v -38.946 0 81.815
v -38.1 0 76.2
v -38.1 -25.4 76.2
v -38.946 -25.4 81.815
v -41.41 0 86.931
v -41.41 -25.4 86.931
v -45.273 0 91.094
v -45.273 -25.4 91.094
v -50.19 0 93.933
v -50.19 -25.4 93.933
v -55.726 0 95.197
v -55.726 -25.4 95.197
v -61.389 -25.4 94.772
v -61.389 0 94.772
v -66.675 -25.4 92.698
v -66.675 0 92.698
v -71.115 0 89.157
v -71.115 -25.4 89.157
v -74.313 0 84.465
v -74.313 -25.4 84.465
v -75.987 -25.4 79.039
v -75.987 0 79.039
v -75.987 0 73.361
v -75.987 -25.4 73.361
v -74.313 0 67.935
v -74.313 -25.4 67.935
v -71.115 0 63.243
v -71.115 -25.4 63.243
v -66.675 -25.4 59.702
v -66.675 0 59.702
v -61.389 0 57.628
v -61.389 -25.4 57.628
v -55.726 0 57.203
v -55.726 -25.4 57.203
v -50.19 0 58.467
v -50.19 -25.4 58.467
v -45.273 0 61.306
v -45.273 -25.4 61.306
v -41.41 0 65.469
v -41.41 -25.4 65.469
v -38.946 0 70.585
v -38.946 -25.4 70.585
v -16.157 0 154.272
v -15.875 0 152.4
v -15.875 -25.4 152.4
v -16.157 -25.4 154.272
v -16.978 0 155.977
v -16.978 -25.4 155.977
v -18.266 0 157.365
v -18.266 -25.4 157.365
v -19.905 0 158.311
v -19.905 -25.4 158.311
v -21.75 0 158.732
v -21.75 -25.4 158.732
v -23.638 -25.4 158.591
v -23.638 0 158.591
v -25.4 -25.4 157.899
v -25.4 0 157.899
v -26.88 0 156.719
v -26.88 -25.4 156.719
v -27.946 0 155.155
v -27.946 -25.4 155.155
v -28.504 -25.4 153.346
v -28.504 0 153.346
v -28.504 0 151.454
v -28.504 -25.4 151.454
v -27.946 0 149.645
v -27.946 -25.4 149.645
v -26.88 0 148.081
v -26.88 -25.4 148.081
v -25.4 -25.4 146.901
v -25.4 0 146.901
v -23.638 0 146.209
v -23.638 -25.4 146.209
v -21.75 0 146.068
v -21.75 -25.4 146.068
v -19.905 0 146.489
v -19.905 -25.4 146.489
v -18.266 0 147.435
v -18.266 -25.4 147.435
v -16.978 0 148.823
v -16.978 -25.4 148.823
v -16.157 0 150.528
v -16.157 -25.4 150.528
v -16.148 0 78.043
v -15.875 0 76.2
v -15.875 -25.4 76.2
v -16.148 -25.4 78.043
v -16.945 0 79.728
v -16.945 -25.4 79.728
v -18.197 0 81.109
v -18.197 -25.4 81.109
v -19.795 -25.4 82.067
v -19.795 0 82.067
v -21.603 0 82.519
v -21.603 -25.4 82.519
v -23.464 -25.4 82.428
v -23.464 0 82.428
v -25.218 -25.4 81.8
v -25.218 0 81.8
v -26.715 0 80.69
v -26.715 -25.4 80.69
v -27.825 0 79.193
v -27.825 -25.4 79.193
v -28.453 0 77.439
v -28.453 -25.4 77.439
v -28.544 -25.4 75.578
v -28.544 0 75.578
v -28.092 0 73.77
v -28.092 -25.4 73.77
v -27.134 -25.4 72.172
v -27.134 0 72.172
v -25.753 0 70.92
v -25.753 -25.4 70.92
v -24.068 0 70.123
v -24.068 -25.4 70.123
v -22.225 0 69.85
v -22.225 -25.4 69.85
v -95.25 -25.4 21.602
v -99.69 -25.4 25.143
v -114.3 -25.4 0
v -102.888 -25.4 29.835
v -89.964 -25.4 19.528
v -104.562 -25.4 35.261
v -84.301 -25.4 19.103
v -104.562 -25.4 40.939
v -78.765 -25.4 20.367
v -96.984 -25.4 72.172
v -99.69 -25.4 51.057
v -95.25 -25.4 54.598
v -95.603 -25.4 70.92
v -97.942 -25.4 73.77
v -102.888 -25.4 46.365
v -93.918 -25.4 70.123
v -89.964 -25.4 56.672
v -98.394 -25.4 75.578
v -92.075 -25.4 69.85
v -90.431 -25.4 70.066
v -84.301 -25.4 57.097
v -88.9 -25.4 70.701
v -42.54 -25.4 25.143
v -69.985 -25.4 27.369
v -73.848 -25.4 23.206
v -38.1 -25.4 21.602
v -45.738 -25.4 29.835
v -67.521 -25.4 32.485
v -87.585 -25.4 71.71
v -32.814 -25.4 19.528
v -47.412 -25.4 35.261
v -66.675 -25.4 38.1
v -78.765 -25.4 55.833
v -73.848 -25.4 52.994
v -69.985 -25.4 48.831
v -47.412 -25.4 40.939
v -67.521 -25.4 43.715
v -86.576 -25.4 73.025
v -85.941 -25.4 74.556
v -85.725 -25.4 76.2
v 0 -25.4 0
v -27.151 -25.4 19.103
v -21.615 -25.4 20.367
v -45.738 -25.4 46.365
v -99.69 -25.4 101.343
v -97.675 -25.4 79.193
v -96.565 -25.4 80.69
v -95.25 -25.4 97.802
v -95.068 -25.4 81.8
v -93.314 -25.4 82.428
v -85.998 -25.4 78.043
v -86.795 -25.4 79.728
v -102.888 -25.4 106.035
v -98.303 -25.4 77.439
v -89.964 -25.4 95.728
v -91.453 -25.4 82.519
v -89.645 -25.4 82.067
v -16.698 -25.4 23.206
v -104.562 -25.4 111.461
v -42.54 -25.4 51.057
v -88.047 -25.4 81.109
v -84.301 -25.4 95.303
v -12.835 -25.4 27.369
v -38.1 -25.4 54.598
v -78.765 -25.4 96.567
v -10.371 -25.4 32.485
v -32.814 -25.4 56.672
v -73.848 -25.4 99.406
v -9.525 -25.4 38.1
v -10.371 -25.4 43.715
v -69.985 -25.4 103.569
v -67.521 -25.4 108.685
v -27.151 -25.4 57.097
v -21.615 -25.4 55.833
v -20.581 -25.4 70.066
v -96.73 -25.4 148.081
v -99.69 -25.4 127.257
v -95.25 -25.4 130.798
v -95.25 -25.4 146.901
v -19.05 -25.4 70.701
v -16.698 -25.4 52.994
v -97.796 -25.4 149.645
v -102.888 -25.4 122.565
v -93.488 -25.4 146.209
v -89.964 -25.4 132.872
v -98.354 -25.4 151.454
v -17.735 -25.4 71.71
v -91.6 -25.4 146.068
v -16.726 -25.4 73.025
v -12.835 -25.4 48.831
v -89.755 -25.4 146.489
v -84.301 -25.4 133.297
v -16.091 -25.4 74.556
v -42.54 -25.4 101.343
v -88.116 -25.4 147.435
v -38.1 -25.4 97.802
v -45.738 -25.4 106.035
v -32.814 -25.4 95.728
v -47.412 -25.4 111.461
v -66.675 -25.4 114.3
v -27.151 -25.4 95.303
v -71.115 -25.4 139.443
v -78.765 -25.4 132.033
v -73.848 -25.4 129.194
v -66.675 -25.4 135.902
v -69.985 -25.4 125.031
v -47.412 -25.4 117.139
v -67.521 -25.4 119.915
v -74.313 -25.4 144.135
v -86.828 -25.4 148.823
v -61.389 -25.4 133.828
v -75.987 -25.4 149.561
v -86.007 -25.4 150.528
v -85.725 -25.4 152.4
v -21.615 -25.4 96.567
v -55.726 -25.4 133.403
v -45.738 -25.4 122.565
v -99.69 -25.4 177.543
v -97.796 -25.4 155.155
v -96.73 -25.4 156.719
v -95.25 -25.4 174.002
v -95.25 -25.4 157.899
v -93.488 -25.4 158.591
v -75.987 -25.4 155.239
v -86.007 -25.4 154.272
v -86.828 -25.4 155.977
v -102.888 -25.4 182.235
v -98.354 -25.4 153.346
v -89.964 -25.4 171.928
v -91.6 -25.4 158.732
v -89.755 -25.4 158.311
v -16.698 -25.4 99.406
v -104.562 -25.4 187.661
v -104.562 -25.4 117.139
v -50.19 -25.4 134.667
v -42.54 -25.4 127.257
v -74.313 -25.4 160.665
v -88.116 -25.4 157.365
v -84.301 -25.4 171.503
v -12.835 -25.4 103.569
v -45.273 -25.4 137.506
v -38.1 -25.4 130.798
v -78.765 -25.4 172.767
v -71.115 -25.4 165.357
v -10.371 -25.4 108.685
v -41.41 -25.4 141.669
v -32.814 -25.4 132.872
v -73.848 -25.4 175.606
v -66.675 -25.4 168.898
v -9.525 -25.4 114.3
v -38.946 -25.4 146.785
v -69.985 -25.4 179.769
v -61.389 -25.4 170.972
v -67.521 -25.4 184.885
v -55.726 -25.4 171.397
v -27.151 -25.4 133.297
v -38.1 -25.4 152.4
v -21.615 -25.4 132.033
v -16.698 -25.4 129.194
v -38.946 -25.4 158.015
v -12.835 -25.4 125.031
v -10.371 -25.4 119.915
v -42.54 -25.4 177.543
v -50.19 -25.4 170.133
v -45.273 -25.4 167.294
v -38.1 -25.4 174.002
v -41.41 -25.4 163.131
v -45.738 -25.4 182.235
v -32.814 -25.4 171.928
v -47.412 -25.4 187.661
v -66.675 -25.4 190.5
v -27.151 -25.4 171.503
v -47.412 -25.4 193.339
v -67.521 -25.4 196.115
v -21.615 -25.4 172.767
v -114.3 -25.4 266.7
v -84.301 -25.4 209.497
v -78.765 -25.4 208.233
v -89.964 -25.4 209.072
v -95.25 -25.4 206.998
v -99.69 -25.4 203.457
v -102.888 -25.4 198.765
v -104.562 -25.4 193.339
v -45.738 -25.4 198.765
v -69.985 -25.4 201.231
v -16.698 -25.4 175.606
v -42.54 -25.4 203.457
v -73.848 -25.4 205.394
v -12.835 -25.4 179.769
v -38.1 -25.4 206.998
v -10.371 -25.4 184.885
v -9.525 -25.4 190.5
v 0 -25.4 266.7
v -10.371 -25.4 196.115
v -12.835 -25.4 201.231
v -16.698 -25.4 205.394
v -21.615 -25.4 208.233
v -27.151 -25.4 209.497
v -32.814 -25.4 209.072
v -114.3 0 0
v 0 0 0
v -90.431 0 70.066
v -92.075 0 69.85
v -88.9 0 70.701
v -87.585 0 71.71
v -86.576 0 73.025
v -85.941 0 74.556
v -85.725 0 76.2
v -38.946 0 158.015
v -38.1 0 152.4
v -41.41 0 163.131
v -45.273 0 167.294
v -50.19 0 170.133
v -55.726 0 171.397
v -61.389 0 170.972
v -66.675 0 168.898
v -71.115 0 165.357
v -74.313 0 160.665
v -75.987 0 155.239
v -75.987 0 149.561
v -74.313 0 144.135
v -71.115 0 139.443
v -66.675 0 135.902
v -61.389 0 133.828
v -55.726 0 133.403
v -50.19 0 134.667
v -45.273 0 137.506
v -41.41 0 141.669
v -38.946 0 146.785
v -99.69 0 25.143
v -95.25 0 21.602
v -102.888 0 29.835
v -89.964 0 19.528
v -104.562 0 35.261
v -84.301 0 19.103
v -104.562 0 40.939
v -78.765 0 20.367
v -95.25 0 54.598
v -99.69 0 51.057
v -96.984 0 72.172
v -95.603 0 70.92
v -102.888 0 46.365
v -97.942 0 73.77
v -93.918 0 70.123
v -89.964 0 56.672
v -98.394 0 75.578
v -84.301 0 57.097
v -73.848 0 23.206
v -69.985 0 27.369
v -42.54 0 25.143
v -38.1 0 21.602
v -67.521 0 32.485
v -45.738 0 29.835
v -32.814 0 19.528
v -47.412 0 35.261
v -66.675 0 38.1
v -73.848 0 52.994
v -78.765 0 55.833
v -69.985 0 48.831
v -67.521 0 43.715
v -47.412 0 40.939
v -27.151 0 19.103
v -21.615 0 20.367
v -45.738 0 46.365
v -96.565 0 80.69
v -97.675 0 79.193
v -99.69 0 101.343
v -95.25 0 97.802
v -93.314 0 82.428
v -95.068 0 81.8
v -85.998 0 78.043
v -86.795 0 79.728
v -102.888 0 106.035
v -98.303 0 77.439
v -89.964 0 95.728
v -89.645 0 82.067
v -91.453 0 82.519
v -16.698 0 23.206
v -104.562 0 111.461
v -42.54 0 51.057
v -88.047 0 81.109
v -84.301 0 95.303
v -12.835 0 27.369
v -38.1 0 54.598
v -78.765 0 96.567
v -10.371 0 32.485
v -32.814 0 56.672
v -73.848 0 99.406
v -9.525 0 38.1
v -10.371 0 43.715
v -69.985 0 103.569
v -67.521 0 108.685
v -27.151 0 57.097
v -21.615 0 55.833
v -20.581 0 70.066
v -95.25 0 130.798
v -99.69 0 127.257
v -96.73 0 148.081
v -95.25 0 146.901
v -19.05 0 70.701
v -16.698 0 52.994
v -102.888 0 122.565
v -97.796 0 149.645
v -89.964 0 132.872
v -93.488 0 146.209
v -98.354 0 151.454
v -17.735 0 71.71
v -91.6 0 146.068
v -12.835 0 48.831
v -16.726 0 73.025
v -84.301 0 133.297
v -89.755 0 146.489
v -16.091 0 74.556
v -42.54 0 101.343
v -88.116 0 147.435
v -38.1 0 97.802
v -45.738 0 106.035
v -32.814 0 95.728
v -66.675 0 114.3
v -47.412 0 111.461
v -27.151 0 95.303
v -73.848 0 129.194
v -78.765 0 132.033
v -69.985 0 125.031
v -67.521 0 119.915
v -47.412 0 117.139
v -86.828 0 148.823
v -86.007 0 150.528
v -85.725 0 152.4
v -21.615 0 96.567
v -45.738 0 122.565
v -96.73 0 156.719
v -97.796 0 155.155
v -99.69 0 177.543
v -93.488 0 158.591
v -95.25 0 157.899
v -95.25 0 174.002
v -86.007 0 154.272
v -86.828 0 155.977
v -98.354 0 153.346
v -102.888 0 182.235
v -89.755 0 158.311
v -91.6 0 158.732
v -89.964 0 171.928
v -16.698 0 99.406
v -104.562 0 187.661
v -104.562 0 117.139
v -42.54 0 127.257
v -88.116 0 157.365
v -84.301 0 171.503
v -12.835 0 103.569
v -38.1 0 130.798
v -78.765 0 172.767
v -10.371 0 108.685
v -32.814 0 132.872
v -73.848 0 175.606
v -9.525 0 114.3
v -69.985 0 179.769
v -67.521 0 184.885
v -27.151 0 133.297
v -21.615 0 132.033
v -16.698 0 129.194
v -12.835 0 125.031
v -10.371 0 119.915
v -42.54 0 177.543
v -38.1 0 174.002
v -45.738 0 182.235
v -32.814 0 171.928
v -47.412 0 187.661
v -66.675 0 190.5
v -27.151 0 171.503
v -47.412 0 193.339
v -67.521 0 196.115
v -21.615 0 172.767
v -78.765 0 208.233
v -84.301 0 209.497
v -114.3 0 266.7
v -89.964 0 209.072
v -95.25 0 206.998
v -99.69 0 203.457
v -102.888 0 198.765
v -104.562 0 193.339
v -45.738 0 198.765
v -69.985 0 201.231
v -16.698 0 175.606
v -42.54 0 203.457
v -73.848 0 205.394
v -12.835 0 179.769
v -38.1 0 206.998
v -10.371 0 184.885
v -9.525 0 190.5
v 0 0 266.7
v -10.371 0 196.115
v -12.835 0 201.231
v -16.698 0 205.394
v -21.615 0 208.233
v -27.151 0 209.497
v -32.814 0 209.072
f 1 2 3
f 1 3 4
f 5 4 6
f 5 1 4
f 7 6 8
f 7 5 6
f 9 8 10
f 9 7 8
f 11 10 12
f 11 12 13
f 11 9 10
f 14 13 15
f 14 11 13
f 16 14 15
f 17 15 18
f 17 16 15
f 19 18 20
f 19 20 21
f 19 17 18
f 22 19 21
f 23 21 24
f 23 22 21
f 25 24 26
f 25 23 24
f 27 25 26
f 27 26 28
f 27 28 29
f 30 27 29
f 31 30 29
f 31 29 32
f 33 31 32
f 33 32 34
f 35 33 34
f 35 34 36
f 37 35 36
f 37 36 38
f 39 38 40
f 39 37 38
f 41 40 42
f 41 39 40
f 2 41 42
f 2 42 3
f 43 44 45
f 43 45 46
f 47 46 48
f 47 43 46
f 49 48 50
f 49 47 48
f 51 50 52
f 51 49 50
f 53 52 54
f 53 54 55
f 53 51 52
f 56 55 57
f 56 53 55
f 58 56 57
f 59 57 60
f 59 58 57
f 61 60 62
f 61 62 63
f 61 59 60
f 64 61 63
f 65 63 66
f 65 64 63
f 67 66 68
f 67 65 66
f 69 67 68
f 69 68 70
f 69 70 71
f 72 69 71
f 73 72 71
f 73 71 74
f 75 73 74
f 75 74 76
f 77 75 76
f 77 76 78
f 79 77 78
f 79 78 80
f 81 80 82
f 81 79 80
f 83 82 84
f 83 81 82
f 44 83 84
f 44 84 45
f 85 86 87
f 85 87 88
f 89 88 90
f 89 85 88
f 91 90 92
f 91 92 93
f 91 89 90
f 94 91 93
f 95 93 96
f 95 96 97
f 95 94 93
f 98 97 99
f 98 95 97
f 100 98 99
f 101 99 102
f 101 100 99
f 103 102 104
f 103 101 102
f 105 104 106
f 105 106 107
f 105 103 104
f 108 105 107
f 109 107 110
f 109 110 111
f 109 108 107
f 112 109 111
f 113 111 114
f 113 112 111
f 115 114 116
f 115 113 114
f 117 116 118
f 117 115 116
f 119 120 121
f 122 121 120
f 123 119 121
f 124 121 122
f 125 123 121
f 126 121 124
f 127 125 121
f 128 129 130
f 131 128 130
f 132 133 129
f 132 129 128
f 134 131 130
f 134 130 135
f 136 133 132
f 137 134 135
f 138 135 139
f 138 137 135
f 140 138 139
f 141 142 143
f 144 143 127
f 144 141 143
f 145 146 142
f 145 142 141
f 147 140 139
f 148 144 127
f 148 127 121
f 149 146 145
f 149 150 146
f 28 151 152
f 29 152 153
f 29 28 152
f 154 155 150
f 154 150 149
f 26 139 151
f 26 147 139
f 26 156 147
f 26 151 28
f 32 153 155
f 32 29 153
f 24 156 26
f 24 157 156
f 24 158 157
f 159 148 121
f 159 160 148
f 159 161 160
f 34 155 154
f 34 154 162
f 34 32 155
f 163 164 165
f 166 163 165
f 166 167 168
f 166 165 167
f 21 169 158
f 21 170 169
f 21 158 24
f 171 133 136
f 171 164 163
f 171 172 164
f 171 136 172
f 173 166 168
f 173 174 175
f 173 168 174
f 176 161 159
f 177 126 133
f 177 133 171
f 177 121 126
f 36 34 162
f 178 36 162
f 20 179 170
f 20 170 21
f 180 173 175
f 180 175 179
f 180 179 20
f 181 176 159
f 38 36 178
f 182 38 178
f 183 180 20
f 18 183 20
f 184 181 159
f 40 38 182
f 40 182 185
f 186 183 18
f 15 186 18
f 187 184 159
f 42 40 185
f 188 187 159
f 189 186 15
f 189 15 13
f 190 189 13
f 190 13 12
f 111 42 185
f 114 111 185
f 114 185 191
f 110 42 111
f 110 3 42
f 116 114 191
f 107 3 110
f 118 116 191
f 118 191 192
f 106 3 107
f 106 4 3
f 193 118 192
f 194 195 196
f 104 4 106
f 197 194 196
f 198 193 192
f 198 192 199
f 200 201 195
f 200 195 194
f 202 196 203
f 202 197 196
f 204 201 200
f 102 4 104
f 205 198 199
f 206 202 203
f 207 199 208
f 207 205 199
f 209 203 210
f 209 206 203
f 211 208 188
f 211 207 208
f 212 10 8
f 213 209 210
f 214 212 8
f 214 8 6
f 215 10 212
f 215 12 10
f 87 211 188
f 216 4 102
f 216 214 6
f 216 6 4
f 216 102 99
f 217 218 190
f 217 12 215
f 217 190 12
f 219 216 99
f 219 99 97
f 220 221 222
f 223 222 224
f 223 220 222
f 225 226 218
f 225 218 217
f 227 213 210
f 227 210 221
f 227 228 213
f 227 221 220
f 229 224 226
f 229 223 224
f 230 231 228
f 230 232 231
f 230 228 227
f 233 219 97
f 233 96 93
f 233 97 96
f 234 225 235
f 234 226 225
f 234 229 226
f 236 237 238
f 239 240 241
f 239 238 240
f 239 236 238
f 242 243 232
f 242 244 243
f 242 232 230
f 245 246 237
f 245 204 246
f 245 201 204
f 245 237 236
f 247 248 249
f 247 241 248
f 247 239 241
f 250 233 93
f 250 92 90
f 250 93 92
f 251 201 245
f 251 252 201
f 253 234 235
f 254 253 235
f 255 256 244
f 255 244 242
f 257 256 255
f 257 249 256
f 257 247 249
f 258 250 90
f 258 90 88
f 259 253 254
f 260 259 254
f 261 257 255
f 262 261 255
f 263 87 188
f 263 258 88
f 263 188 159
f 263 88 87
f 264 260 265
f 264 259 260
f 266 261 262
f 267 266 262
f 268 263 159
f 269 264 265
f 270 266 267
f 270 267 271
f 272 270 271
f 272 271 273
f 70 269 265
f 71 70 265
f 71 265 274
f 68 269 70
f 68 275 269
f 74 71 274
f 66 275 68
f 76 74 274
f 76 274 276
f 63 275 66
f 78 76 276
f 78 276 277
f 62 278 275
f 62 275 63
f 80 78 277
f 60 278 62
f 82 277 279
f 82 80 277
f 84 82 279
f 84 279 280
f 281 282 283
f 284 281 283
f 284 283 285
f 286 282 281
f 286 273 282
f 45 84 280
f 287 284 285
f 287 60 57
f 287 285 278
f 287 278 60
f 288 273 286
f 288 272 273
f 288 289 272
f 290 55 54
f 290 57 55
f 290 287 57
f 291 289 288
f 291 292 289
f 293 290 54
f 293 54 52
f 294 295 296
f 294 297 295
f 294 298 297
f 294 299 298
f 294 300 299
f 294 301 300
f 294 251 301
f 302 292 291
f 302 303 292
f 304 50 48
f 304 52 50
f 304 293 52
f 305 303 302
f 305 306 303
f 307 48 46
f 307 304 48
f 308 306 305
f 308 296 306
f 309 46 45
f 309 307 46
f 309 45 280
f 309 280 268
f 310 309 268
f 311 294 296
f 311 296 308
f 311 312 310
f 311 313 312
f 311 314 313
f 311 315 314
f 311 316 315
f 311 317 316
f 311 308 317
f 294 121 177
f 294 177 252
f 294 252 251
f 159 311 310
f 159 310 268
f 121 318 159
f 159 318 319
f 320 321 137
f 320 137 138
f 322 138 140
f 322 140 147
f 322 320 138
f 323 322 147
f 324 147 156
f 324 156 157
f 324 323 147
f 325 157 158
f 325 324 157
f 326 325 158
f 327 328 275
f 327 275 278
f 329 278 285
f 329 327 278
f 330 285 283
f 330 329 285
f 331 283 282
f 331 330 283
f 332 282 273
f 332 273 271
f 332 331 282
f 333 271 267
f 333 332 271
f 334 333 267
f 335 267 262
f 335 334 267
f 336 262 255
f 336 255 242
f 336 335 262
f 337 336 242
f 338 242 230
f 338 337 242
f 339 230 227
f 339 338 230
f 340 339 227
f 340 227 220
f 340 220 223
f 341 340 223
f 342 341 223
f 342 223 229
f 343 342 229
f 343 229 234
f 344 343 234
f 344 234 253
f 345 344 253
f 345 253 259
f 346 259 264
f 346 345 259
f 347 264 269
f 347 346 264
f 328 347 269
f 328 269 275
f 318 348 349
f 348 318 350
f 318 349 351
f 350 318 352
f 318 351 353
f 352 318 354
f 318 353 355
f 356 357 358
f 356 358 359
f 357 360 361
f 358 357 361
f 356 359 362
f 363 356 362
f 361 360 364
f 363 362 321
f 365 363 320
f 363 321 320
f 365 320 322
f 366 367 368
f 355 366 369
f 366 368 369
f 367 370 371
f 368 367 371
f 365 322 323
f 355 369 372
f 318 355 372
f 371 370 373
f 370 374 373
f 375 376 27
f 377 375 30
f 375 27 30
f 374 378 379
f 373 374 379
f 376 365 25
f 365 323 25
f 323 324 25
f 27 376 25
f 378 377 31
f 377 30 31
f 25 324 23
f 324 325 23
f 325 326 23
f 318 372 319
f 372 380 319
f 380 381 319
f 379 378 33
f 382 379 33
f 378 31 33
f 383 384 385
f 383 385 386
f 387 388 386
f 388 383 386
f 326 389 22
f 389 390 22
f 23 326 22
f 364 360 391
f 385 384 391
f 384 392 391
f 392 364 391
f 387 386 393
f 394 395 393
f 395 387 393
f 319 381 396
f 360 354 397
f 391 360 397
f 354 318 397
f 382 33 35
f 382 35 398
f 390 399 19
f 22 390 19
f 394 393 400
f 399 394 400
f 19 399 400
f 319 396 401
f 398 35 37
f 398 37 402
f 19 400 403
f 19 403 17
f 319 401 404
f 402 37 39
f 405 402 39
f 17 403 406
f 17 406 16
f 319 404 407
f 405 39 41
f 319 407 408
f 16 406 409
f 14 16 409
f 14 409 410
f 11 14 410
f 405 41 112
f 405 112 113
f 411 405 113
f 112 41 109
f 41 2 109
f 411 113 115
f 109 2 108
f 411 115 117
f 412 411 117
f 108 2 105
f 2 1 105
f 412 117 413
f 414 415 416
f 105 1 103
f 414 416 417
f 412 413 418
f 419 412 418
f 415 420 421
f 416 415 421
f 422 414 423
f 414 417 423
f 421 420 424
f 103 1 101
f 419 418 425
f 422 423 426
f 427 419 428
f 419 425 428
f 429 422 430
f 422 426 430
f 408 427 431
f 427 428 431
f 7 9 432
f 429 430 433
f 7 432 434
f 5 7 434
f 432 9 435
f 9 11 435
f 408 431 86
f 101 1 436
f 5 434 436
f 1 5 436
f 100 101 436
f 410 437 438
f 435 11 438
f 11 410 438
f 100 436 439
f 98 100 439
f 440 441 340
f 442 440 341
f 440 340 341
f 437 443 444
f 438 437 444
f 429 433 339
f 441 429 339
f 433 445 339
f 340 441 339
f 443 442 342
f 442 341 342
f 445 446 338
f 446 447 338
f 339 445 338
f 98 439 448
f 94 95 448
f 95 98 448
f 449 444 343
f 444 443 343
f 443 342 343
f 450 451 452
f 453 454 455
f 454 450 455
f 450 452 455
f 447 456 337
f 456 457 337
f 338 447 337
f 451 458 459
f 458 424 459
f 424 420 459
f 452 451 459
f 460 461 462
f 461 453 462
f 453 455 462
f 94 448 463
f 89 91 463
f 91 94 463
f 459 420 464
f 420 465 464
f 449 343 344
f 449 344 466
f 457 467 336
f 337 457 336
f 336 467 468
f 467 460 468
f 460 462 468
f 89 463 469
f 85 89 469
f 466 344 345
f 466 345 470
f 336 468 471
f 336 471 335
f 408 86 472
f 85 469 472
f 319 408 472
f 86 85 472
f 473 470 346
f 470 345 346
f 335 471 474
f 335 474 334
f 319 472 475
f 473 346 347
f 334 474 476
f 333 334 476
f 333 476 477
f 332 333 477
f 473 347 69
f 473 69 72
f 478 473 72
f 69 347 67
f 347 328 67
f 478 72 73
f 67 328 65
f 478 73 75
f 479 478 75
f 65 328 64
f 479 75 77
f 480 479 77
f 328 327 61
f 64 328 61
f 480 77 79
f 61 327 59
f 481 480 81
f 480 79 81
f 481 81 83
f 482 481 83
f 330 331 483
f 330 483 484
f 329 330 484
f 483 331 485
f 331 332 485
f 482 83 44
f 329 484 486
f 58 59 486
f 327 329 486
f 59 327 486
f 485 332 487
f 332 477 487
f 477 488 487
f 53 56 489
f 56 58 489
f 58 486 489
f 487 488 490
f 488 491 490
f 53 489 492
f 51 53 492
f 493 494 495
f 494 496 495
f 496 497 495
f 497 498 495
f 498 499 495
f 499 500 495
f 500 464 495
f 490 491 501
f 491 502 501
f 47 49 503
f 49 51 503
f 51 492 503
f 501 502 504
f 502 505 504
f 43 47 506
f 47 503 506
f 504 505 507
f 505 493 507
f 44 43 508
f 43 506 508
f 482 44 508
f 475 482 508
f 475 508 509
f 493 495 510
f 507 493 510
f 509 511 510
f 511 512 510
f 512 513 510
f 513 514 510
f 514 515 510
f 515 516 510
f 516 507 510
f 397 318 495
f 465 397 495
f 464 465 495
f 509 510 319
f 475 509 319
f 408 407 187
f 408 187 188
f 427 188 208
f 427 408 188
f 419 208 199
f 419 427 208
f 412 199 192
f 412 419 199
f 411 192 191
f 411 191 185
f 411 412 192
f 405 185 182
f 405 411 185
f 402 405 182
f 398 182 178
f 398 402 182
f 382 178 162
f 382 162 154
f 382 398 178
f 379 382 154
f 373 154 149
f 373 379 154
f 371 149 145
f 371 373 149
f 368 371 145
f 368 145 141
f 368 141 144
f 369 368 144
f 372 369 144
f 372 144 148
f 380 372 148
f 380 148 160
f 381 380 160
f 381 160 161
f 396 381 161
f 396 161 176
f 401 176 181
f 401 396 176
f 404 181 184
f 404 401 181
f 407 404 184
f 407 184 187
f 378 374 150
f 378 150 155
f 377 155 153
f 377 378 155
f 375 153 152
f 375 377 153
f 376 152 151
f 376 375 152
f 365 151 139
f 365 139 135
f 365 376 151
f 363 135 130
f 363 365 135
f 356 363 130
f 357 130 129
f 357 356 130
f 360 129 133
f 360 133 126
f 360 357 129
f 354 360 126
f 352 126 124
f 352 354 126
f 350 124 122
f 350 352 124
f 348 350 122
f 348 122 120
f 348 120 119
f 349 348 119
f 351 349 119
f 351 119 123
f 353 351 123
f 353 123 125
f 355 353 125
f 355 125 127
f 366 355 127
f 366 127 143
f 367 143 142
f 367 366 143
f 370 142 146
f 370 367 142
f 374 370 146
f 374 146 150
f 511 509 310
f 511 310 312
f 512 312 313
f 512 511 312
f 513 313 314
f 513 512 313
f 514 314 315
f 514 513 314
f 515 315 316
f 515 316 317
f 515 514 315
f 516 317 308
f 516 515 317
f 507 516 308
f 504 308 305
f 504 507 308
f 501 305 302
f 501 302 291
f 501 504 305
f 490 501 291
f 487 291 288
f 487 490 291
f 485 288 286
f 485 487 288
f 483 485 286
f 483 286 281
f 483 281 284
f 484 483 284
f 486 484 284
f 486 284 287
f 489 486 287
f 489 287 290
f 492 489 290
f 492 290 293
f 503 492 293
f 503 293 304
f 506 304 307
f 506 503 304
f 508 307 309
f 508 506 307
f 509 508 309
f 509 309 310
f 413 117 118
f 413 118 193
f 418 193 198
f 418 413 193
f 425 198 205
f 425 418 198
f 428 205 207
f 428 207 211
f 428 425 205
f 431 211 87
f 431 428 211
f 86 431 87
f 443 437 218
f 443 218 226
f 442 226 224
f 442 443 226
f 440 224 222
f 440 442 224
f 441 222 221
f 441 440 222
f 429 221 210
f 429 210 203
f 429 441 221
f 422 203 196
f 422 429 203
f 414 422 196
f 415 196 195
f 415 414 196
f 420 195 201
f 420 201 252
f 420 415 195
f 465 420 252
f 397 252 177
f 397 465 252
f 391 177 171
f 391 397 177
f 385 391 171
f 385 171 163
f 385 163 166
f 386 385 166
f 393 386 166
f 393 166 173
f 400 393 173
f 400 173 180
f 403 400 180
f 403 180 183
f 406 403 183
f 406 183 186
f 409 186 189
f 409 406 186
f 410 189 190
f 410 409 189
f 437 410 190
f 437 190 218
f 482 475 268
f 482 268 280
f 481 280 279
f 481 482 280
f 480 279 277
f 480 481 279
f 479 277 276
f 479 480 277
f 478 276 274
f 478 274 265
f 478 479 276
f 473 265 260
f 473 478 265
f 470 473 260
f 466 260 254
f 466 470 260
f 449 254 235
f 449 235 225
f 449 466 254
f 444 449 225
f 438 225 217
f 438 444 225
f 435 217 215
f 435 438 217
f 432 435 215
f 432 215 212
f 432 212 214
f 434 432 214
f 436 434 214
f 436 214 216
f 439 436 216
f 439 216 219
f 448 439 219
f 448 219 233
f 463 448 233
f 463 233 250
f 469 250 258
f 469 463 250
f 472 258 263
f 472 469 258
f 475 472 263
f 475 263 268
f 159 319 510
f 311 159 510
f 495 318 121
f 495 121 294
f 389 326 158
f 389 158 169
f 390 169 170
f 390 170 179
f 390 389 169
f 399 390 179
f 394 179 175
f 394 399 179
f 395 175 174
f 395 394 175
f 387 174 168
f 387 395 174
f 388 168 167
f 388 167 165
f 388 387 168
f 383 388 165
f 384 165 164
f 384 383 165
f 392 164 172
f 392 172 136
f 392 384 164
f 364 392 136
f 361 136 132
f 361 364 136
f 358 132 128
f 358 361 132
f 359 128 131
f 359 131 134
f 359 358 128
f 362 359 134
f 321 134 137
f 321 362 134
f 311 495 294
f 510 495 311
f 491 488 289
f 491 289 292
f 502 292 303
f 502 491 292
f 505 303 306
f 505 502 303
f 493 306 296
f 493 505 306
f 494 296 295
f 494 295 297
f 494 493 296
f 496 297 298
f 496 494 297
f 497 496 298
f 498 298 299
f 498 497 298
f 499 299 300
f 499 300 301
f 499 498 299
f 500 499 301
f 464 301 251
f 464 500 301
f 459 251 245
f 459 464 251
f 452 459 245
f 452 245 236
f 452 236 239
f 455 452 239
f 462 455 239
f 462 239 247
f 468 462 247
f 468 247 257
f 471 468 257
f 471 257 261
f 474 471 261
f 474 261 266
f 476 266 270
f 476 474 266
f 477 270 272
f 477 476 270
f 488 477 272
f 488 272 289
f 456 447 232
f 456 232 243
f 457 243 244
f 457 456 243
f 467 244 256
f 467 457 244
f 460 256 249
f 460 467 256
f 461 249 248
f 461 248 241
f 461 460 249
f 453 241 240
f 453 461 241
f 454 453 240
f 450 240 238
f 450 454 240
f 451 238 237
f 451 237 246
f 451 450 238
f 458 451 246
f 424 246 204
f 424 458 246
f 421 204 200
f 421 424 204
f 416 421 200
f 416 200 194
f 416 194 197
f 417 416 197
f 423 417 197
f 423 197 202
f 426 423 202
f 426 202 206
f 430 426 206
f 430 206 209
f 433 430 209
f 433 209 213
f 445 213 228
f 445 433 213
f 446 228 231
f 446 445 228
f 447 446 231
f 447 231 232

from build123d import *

# Parameters (mm, degrees)
F0_W     = 114.3
F0_H     = 266.7
F3_DEPTH = 25.4
F1_R     = 19.05
F4_DEPTH = 25.4
F2_R     = 6.35
F5_DEPTH = 25.4


with BuildPart() as f3:
    # F0 (on Front) → F3 (new body)
    with BuildSketch(Plane.XZ):
        with Locations((-57.15, 133.35)):
            Rectangle(F0_W, F0_H)
    extrude(amount=F3_DEPTH)

    # F1 (on face) → F4 (cut)
    with BuildSketch(Plane.XZ):
        with Locations((-85.725, 38.1)):
            Circle(F1_R)
        with Locations((-28.575, 38.1)):
            Circle(F1_R)
        with Locations((-57.15, 76.2)):
            Circle(F1_R)
        with Locations((-57.15, 152.4)):
            Circle(F1_R)
        with Locations((-28.575, 114.3)):
            Circle(F1_R)
        with Locations((-85.725, 114.3)):
            Circle(F1_R)
        with Locations((-28.575, 190.5)):
            Circle(F1_R)
        with Locations((-85.725, 190.5)):
            Circle(F1_R)
    extrude(amount=F4_DEPTH, mode=Mode.SUBTRACT)

    # F2 (on face) → F5 (cut)
    with BuildSketch(Plane.XZ):
        with BuildLine():
            ThreePointArc((-85.725, 76.2), (-96.565128, 80.690128), (-92.075, 69.85))
            ThreePointArc((-92.075, 69.85), (-87.584872, 71.709872), (-85.725, 76.2))
        make_face()
        with BuildLine():
            ThreePointArc((-15.875, 76.2), (-26.715128, 80.690128), (-22.225, 69.85))
            ThreePointArc((-22.225, 69.85), (-17.734872, 71.709872), (-15.875, 76.2))
        make_face()
        with Locations((-92.075, 152.4)):
            Circle(F2_R)
        with Locations((-22.225, 152.4)):
            Circle(F2_R)
    extrude(amount=F5_DEPTH, mode=Mode.SUBTRACT)


solid = f3.part
